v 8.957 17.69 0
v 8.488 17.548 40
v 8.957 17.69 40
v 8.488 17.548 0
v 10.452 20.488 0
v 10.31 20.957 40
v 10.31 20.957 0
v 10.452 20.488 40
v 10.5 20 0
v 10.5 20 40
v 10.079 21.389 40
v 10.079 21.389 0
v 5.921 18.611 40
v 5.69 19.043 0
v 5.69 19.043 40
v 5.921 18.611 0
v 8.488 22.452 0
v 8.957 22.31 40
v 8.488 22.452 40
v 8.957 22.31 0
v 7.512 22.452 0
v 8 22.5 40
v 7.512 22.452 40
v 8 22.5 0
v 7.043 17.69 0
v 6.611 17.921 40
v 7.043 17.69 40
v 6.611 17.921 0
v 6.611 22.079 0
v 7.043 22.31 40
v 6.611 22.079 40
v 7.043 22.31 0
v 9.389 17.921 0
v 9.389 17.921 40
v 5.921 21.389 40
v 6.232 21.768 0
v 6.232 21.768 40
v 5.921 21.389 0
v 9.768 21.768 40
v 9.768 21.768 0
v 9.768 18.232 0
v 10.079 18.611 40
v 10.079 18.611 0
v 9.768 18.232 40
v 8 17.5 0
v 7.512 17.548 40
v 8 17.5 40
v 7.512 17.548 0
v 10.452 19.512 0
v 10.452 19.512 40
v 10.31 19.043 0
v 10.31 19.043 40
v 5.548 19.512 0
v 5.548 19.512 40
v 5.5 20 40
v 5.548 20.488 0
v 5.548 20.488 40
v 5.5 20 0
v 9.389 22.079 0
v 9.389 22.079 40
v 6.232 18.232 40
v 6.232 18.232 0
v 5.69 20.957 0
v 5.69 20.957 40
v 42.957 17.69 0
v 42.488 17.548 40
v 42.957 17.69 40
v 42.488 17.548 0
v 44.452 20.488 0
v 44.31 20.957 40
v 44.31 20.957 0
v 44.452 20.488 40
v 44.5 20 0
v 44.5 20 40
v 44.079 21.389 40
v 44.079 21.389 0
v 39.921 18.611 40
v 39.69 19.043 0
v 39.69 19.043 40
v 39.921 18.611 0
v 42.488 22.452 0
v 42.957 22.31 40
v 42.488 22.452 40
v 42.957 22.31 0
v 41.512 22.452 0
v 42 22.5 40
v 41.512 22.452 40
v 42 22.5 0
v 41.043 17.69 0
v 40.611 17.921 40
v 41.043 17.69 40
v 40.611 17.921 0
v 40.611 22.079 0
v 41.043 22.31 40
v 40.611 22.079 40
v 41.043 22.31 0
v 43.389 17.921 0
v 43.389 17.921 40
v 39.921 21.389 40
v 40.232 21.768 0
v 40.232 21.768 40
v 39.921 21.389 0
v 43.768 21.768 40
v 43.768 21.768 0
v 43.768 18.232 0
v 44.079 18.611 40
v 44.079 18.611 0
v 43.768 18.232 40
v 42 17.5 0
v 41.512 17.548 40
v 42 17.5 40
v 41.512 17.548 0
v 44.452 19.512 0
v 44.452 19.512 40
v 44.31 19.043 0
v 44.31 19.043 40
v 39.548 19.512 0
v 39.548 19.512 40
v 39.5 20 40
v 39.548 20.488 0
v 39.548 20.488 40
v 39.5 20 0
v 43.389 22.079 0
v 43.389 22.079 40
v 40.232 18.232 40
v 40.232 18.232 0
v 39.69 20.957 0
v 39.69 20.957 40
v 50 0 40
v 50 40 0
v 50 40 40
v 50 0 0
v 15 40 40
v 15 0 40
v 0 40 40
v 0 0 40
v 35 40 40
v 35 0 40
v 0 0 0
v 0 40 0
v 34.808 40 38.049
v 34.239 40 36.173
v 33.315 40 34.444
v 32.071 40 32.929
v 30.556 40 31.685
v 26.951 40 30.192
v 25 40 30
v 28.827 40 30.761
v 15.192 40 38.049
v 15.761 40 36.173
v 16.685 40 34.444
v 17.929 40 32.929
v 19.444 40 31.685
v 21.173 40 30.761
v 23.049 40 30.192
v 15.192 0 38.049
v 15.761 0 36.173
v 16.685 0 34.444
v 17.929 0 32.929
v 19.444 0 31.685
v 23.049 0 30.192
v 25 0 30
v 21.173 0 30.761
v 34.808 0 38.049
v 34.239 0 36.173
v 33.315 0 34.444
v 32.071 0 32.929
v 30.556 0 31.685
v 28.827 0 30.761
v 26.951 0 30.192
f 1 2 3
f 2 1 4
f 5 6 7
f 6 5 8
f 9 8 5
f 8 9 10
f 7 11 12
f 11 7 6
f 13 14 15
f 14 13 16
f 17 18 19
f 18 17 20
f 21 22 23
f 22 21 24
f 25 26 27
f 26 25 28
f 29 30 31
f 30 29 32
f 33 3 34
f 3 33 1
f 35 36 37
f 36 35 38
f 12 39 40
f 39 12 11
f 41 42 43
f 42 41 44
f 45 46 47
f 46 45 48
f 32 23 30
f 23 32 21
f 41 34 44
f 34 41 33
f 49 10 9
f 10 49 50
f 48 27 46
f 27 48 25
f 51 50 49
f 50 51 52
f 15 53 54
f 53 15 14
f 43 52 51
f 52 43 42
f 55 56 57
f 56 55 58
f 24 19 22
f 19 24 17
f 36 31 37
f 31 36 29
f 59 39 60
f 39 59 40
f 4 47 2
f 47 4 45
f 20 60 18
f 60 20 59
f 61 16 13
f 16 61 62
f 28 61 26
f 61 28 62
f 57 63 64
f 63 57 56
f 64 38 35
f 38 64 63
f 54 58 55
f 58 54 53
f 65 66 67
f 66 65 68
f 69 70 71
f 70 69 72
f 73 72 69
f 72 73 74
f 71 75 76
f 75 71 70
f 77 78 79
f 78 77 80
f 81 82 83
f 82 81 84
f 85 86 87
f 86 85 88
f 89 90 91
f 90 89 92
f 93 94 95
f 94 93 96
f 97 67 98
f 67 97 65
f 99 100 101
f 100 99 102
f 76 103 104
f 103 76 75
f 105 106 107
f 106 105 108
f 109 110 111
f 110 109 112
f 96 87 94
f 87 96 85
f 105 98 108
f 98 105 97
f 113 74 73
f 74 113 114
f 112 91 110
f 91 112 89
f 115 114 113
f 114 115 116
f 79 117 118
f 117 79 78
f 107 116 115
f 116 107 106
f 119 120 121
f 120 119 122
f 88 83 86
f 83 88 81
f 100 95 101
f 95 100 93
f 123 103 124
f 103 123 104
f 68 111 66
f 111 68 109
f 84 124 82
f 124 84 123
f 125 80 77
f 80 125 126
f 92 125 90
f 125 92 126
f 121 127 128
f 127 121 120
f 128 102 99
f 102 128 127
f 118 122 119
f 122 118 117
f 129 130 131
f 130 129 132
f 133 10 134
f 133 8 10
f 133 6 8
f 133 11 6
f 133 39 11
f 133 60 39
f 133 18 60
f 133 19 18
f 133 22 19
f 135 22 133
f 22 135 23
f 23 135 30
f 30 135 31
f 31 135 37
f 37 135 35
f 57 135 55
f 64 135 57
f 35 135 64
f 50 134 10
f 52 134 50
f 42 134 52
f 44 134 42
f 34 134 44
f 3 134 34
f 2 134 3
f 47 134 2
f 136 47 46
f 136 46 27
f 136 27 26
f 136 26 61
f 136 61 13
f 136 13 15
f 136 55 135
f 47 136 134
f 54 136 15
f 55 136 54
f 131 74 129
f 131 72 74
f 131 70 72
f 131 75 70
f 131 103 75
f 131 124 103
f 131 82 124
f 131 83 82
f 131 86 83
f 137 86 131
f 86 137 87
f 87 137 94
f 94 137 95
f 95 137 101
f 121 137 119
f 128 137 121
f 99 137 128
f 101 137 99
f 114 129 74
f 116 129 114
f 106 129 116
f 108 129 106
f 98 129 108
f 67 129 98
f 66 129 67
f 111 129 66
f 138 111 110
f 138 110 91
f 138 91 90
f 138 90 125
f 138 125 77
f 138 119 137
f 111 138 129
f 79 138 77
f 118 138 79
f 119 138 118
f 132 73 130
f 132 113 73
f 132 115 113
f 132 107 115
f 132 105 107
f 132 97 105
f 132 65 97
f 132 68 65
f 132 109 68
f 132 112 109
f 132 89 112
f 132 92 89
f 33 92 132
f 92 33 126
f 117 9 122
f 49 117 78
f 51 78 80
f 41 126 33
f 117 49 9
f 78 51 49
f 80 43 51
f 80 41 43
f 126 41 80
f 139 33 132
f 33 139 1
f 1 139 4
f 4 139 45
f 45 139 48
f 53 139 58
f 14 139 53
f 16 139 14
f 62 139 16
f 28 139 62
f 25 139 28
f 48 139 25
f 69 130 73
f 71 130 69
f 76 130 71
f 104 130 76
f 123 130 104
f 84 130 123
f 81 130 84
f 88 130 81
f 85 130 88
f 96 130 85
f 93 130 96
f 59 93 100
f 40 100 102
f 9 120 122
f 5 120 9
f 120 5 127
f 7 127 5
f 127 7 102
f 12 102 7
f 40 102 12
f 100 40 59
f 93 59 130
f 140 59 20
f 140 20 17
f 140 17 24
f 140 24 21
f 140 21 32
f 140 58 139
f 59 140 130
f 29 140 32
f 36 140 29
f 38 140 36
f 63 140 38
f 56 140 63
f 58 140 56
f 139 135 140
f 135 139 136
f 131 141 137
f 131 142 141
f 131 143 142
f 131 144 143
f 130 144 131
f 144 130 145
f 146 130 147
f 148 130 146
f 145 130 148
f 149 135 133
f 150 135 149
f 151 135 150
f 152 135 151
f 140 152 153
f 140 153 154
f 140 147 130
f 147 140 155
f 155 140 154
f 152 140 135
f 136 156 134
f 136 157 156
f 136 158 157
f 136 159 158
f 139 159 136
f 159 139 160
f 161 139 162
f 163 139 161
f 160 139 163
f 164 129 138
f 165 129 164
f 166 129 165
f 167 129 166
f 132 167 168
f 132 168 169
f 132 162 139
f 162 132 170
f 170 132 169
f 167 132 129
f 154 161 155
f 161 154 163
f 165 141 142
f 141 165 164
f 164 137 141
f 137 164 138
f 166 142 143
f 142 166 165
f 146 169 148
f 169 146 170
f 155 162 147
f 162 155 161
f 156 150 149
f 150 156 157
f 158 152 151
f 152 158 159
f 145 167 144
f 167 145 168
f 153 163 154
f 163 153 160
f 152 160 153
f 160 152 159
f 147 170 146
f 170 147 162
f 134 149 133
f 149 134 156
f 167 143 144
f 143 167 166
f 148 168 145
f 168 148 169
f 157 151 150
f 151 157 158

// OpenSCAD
$fn = 32;

// ----------------------------------------------------------------------
// Saddle clamp: plain shaft clamp
// ----------------------------------------------------------------------

// --- parameters (mm) ---
blk_l = 50;               // block length, X
blk_w = 40;               // block width, Y
blk_h = 40;               // block height
clamp_r = 10;             // shaft groove radius
hole_r = 2.5;             // bolt hole radius
hole_m = 8;               // bolt hole margin from the ends

saw_depth = clamp_r + 3;  // saw kerf depth

difference() {
  cube([blk_l, blk_w, blk_h]);
  translate([blk_l / 2, -1, blk_h])
    rotate([-90, 0, 0])
      cylinder(h = blk_w + 2, r = clamp_r);
  for (sx = [0, 1])
    translate([sx ? blk_l - hole_m : hole_m, blk_w / 2, -1])
      cylinder(r = hole_r, h = blk_h + 2);
}
